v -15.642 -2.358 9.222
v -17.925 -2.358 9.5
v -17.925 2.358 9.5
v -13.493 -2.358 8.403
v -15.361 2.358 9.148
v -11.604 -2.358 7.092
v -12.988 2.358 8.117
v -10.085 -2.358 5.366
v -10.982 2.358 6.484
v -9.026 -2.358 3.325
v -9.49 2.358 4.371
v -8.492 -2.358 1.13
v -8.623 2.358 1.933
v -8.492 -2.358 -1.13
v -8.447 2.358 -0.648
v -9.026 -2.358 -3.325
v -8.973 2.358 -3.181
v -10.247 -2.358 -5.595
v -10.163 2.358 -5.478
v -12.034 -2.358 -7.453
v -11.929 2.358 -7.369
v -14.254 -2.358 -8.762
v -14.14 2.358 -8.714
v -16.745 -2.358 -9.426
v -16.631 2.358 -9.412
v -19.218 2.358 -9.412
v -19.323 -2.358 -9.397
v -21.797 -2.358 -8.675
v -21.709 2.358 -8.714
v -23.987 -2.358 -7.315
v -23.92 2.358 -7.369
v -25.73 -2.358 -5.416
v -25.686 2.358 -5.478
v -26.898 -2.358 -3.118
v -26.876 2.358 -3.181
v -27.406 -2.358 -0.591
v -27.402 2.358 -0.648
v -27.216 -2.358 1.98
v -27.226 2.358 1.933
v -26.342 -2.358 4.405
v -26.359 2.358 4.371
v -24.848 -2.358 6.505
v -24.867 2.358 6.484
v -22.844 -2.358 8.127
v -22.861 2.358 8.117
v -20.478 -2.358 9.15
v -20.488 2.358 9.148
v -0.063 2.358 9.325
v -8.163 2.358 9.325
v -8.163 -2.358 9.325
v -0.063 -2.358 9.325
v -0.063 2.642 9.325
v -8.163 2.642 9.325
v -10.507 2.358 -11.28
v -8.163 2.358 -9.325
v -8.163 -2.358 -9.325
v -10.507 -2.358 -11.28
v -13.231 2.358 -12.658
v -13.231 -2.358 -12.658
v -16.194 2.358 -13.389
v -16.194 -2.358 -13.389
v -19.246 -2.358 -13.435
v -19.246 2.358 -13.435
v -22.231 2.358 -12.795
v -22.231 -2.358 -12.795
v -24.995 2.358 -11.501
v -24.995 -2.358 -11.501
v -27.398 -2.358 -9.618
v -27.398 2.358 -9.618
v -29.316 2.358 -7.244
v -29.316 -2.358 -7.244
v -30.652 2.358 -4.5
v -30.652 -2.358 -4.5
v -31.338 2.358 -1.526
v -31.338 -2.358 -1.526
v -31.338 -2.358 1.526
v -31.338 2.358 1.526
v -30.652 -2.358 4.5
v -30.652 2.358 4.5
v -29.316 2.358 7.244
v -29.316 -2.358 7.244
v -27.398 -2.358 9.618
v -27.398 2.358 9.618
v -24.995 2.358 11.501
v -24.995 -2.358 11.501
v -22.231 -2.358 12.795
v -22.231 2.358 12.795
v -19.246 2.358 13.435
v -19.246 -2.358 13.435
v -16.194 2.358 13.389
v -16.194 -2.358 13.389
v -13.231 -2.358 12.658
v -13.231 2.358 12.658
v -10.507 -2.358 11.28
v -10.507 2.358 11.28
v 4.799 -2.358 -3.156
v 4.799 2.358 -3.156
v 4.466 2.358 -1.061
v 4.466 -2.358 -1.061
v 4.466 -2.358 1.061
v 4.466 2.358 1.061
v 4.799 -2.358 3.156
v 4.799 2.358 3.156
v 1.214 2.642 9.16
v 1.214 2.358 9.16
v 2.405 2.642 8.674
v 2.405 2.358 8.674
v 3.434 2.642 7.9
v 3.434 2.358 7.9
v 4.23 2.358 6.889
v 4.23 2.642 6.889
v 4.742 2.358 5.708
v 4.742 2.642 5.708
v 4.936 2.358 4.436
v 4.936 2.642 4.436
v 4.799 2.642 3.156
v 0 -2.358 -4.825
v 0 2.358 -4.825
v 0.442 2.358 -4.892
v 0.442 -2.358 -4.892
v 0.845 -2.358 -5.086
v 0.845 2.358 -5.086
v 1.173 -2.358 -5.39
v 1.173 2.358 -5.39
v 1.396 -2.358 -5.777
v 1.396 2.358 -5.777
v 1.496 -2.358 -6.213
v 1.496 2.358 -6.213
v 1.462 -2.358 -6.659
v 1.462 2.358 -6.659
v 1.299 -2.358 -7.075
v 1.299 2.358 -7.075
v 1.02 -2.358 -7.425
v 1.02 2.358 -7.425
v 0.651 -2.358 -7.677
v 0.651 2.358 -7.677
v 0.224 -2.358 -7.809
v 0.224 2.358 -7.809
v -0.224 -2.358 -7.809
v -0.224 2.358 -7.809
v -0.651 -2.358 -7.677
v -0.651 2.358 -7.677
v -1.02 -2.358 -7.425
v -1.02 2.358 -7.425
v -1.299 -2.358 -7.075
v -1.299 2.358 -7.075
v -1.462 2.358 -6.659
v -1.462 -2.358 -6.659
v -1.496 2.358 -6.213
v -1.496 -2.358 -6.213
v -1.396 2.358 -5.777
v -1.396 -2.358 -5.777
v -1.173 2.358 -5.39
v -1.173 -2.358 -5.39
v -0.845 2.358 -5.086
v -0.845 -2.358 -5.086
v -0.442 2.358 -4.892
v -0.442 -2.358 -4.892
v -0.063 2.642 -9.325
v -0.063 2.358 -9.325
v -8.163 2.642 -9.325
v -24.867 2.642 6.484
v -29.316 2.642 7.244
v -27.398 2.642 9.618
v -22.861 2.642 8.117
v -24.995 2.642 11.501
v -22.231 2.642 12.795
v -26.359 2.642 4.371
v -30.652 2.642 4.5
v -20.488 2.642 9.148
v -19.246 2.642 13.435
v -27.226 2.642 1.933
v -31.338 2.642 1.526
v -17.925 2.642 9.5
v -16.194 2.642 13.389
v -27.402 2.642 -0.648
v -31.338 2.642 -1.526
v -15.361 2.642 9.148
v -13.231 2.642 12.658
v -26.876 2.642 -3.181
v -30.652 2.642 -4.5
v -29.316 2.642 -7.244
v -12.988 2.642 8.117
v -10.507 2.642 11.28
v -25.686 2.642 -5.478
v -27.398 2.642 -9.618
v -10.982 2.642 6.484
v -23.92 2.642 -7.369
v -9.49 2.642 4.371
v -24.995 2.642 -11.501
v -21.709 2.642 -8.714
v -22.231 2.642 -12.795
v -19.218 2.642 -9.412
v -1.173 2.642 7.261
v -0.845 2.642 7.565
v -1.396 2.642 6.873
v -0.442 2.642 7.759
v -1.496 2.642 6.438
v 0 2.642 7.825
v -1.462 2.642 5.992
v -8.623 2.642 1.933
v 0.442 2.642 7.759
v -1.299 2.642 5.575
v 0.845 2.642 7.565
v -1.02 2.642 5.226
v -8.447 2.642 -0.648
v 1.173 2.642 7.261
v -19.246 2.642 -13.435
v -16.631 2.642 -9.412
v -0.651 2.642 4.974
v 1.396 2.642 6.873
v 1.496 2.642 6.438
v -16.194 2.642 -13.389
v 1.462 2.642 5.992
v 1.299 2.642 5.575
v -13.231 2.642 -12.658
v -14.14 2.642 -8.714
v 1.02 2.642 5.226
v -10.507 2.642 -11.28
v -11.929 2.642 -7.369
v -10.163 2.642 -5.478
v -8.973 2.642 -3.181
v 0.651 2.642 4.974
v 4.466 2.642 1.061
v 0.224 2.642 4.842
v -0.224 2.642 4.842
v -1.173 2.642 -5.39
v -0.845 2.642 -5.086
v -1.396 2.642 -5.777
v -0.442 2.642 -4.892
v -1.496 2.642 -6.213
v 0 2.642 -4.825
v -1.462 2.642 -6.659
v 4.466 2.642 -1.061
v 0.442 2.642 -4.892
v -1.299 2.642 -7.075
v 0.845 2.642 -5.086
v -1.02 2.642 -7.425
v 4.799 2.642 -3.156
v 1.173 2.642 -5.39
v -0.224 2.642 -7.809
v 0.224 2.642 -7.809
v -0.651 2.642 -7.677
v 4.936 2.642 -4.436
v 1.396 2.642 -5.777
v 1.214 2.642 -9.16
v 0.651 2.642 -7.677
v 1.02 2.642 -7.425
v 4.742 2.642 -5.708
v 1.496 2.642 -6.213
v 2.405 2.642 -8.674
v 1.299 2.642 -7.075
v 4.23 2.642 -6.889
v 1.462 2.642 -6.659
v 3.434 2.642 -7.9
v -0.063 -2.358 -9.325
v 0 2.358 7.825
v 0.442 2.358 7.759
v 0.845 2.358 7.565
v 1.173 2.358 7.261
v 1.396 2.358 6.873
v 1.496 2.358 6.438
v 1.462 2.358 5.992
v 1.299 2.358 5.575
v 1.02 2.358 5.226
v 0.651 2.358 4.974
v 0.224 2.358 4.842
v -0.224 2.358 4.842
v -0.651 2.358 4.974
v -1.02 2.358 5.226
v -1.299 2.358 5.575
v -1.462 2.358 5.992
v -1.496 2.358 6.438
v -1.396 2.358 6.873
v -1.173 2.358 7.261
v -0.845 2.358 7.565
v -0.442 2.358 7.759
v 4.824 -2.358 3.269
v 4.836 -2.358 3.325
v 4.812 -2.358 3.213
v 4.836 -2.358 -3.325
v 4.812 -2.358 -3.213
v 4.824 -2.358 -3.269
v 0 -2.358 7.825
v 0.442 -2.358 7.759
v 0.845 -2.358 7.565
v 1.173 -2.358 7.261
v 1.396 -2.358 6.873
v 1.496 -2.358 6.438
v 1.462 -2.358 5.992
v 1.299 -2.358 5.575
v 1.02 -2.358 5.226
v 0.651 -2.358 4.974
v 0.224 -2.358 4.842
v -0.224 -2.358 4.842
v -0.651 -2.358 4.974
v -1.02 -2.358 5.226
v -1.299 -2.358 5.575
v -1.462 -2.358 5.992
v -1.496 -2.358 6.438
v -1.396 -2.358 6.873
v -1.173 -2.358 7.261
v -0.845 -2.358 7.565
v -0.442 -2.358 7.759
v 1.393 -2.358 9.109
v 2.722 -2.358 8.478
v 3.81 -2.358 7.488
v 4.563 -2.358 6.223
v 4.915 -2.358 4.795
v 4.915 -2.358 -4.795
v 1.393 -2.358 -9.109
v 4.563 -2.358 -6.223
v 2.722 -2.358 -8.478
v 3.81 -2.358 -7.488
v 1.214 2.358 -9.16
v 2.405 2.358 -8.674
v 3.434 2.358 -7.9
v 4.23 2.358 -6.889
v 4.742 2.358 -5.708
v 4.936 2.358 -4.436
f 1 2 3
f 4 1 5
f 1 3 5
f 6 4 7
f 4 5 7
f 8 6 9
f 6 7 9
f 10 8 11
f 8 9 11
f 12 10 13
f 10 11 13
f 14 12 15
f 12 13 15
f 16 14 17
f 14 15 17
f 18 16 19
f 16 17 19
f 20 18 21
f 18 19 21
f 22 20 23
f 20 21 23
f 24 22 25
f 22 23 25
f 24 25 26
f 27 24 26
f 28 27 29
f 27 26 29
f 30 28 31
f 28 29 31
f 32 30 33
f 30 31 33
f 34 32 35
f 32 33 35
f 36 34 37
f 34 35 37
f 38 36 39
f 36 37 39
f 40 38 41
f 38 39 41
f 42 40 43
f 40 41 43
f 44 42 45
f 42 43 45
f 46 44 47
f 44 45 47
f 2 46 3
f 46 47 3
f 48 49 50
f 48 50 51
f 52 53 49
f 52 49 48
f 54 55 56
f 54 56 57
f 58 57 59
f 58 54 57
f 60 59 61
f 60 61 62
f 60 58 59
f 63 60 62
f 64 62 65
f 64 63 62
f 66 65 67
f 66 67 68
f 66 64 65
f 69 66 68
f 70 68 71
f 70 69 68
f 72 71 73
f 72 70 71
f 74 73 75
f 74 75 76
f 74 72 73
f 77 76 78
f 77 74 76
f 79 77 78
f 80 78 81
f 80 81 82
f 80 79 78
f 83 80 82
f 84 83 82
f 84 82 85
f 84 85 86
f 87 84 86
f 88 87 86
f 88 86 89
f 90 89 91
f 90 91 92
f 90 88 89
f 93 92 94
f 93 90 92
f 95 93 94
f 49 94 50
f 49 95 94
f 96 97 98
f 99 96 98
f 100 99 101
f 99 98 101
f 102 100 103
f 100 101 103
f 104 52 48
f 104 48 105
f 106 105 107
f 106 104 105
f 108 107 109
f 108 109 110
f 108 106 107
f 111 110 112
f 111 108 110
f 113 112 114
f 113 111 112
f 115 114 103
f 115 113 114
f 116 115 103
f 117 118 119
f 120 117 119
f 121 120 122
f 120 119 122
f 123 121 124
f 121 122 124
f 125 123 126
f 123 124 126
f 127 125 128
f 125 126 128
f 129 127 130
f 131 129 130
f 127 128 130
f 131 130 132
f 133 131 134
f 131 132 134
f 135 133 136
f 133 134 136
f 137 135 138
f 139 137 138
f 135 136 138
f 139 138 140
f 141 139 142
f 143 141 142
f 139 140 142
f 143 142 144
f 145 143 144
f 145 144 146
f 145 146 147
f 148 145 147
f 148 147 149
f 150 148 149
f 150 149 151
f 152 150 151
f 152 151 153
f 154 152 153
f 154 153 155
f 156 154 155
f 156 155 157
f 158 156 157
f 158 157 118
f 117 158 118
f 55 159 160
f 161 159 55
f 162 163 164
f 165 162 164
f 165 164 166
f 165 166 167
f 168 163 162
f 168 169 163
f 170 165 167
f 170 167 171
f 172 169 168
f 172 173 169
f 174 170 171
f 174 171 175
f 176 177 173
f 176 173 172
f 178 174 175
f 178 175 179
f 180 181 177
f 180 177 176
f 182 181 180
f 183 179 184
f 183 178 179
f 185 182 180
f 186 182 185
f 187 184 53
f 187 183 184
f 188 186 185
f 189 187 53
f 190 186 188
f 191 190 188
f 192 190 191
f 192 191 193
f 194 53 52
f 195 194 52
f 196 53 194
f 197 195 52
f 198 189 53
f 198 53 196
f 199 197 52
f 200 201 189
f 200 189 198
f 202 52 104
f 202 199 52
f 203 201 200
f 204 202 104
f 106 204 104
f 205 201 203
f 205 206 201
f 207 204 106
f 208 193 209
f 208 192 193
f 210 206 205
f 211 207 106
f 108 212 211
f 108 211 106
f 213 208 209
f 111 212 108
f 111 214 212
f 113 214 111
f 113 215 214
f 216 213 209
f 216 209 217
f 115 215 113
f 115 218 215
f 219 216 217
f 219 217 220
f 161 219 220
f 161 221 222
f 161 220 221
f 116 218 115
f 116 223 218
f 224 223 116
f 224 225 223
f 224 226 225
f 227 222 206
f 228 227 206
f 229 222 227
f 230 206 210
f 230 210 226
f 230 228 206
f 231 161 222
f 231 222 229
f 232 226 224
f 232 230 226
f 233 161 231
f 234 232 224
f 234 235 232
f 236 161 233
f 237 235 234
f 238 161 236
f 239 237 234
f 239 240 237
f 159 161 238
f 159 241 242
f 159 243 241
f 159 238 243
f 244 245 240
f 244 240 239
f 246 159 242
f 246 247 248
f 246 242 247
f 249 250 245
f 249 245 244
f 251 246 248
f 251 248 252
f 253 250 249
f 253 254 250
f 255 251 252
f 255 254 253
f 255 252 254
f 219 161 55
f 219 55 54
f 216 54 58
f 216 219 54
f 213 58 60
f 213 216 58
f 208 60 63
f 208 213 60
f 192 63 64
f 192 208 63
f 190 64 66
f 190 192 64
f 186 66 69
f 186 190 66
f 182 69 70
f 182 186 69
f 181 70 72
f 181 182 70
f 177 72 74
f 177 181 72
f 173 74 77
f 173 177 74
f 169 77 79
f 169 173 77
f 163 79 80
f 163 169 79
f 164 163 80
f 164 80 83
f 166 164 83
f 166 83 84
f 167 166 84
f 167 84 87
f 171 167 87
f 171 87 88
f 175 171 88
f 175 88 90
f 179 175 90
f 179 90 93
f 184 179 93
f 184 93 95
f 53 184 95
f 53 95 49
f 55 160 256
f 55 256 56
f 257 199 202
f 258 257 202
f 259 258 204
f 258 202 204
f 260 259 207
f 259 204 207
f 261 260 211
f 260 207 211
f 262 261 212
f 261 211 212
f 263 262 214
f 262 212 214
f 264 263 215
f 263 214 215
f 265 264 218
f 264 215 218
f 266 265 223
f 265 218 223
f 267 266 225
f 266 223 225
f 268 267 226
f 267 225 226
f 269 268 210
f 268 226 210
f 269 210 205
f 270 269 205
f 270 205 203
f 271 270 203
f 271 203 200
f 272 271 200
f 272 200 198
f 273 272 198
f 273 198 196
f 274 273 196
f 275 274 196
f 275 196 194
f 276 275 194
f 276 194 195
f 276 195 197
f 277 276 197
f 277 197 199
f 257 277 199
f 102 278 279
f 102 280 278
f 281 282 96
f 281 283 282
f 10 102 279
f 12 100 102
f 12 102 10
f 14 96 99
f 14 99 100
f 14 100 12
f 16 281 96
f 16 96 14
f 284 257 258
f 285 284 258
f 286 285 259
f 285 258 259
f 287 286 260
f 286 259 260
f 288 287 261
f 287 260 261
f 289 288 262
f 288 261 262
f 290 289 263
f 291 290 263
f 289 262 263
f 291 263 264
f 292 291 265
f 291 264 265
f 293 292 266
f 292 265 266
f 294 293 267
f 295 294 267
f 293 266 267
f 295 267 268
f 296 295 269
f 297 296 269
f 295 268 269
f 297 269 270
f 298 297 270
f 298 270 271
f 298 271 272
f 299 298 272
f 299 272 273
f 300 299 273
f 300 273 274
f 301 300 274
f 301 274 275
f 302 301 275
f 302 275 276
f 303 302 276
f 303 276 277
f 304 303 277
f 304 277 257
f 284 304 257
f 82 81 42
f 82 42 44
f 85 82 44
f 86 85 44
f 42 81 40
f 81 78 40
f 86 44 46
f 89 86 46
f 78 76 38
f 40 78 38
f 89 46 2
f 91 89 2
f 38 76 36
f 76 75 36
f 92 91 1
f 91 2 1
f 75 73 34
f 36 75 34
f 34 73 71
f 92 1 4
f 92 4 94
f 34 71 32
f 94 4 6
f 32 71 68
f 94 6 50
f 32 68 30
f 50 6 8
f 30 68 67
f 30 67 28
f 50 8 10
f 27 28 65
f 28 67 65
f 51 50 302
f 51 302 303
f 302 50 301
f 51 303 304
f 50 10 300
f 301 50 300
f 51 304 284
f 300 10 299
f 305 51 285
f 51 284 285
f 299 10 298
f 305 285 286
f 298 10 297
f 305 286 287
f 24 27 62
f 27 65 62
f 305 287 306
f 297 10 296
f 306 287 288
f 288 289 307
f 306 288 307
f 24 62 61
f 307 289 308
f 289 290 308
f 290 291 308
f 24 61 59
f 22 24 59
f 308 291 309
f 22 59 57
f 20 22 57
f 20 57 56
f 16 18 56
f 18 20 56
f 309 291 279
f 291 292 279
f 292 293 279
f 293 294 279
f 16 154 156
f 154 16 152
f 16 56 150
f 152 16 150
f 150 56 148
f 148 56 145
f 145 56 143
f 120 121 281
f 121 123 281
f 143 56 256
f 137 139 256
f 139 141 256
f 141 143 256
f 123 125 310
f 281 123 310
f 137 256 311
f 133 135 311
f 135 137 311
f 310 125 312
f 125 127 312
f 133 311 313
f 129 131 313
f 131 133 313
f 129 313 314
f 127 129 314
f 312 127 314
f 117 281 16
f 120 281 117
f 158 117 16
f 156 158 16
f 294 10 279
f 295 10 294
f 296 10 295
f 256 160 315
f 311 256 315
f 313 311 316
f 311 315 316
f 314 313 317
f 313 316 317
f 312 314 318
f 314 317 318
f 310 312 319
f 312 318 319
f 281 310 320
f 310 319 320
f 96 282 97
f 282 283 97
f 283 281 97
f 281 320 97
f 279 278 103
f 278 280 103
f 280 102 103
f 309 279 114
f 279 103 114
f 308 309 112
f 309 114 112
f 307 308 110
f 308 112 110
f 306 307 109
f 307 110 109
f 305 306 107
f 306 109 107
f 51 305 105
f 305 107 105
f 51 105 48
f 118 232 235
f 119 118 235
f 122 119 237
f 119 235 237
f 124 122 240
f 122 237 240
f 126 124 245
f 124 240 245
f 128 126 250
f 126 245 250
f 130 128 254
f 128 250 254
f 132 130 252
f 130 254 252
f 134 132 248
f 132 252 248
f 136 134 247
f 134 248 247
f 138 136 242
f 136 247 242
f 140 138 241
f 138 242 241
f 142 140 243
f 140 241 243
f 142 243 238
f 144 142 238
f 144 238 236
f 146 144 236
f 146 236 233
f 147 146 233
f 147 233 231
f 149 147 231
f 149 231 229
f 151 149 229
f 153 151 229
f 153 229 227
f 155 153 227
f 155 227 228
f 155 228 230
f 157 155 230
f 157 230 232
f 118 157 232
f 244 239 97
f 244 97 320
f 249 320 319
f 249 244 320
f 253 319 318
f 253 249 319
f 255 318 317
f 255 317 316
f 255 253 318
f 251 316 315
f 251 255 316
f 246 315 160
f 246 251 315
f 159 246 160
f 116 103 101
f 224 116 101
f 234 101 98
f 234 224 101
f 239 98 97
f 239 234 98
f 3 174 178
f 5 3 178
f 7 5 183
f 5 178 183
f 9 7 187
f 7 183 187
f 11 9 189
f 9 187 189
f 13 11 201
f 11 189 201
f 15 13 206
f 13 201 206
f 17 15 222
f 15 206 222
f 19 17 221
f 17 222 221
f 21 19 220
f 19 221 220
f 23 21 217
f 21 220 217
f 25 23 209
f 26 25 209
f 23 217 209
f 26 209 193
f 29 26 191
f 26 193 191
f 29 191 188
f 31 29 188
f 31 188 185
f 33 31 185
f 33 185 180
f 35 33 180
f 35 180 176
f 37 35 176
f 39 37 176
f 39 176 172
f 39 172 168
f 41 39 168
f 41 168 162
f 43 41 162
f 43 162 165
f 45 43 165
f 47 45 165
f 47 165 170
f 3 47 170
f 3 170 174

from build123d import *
from build123d.topology import SkipClean

# Parameters (mm, degrees)
SKETCH1_R           = 4.05
BOSS_EXTRUDE1_DEPTH = 5
SCALE1_SCALE        = 0.471698113
SKETCH2_R           = 1.910377358
BOSS_EXTRUDE3_DEPTH = 4.716981
SKETCH3_R           = 9.5
CUT_EXTRUDE1_DEPTH  = 35.525365892
SKETCH4_R           = 13.5
CUT_EXTRUDE2_DEPTH  = 35.525365892
SKETCH5_R           = 1.5
CUT_EXTRUDE3_DEPTH  = 35.525365892
FILLET1_R           = 5
BOSS_EXTRUDE4_START = 5
SKETCH6_R           = 9.5
SKETCH6_R_2         = 1.5
BOSS_EXTRUDE4_DEPTH = 5


with BuildPart() as part:
    # Sketch1 → Boss-Extrude1 (new, symmetric)
    with BuildSketch(Plane(origin=(0, 0, 0), x_dir=(1, 0, 0), z_dir=(0, 1, 0))):
        with BuildLine():
            Line((-38, 7.05), (38, 7.05))
            ThreePointArc((38, 7.05), (45.05, 0), (38, -7.05))
            Line((38, -7.05), (-38, -7.05))
            ThreePointArc((-38, -7.05), (-45.05, 0), (-38, 7.05))
        make_face()
        with Locations(Location((-38, 0, 0), (0, 0, 270))):
            Circle(SKETCH1_R, mode=Mode.SUBTRACT)
        with Locations(Location((38, 0, 0), (0, 0, 270))):
            Circle(SKETCH1_R, mode=Mode.SUBTRACT)
    extrude(amount=BOSS_EXTRUDE1_DEPTH, both=True)


with BuildPart() as part_1:
    # Scale1: scaled about (0, 0, 0)
    add(part.part.scale(SCALE1_SCALE))

    # Sketch2 → Boss-Extrude3 (add, through all)
    with BuildSketch(Plane(origin=(0, 2.358490566, 0), x_dir=(1, 0, 0), z_dir=(0, 1, 0))):
        with BuildLine():
            Line((8.163095128, 9.325471698), (-8.163095128, 9.325471698))
            ThreePointArc((-8.163095128, 9.325471698), (-31.424528302, 0), (-8.163095128, -9.325471698))
            Line((-8.163095128, -9.325471698), (8.163095128, -9.325471698))
            ThreePointArc((8.163095128, -9.325471698), (31.424528302, 0), (8.163095128, 9.325471698))
        make_face()
        with Locations(Location((-17.924528302, 0, 0), (0, 0, 270))):
            Circle(SKETCH2_R, mode=Mode.SUBTRACT)
        with Locations(Location((17.924528302, 0, 0), (0, 0, 270))):
            Circle(SKETCH2_R, mode=Mode.SUBTRACT)
    extrude(amount=-BOSS_EXTRUDE3_DEPTH)

    # Sketch3 → Cut-Extrude1 (cut, through all)
    with BuildSketch(Plane(origin=(0, 2.358490566, 0), x_dir=(1, 0, 0), z_dir=(0, 1, 0))):
        with Locations(Location((-17.924528302, 0, 0), (0, 0, 270))):
            Circle(SKETCH3_R)
        with Locations(Location((17.924528302, 0, 0), (0, 0, 270))):
            Circle(SKETCH3_R)
    extrude(amount=-CUT_EXTRUDE1_DEPTH, mode=Mode.SUBTRACT)

    # Sketch4 → Cut-Extrude2 (cut, through all)
    with BuildSketch(Plane(origin=(0, 2.358490566, 0), x_dir=(1, 0, 0), z_dir=(0, 1, 0))):
        with Locations((17.924528302, 0)):
            Circle(SKETCH4_R)
    extrude(amount=-CUT_EXTRUDE2_DEPTH, mode=Mode.SUBTRACT)

    # Sketch5 → Cut-Extrude3 (cut, through all)
    with BuildSketch(Plane(origin=(0, 2.358490566, 0), x_dir=(1, 0, 0), z_dir=(0, 1, 0))):
        with Locations(Location((0, 6.325471698, 0), (0, 0, 270))):
            Circle(SKETCH5_R)
        with Locations(Location((0, -6.325471698, 0), (0, 0, 270))):
            Circle(SKETCH5_R)
    extrude(amount=-CUT_EXTRUDE3_DEPTH, mode=Mode.SUBTRACT)

    # Fillet1
    # the kernel refuses this fillet: 5 mm, written as the material it takes off along each edge
    with BuildSketch(Plane(origin=(8.163095128, 22.922972313, -9.325471698), x_dir=(-0.47879135569736214, 0, 0.8779287201757795), z_dir=(0, -1, 0))) as fillet1_piece_1:
        with BuildLine():
            CenterArc((8.328082039, 4.827702878), FILLET1_R, 151.393506733, 103.521444362)
            Line((3.938438438, 7.221659656), (0, 0))
            ThreePointArc((0, 0), (3.51340961, 0.46520223), (7.02681922, 0))
        make_face()
    extrude(amount=45.845944493, mode=Mode.SUBTRACT)
    with BuildSketch(Plane(origin=(8.163095128, 22.922972313, 9.325471698), x_dir=(-1, 0, 0), z_dir=(0, -1, 0))) as fillet1_piece_2:
        with BuildLine():
            CenterArc((8.225792699, 5), FILLET1_R, 166.478555638, 103.521444362)
            ThreePointArc((3.364380301, 6.169046405), (2.090604549, 2.861788396), (0, 0))
            Line((0, 0), (8.225792699, 0))
        make_face()
    extrude(amount=45.845944493, mode=Mode.SUBTRACT)

    # Sketch6 → Boss-Extrude4 (add)
    with SkipClean():  # the faces are left unmerged after this step: merging them gives an invalid solid
        with BuildSketch(Plane(origin=(0, -2.358490566, 0), x_dir=(1, 0, 0), z_dir=(0, 1, 0)).offset(BOSS_EXTRUDE4_START)):
            with BuildLine():
                Line((-8.163095128, -9.325471698), (-0.062697571, -9.325471698))
                ThreePointArc((-0.062697571, -9.325471698), (3.864466293, -7.42020658), (4.798714827, -3.156425293))
                ThreePointArc((4.798714827, -3.156425293), (4.424528302, 0), (4.798714827, 3.156425293))
                ThreePointArc((4.798714827, 3.156425293), (3.864466293, 7.42020658), (-0.062697571, 9.325471698))
                Line((-0.062697571, 9.325471698), (-8.163095128, 9.325471698))
                ThreePointArc((-8.163095128, 9.325471698), (-31.424528302, 0), (-8.163095128, -9.325471698))
            make_face()
            with Locations(Location((-17.924528302, 0, 0), (0, 0, 270))):
                Circle(SKETCH6_R, mode=Mode.SUBTRACT)
            with Locations(Location((0, -6.325471698, 0), (0, 0, 270))):
                Circle(SKETCH6_R_2, mode=Mode.SUBTRACT)
            with Locations(Location((0, 6.325471698, 0), (0, 0, 270))):
                Circle(SKETCH6_R_2, mode=Mode.SUBTRACT)
        extrude(amount=-BOSS_EXTRUDE4_DEPTH)
    add(part_1.part.scale(1), mode=Mode.REPLACE)  # the faces are merged on a copy


solid = part_1.part
